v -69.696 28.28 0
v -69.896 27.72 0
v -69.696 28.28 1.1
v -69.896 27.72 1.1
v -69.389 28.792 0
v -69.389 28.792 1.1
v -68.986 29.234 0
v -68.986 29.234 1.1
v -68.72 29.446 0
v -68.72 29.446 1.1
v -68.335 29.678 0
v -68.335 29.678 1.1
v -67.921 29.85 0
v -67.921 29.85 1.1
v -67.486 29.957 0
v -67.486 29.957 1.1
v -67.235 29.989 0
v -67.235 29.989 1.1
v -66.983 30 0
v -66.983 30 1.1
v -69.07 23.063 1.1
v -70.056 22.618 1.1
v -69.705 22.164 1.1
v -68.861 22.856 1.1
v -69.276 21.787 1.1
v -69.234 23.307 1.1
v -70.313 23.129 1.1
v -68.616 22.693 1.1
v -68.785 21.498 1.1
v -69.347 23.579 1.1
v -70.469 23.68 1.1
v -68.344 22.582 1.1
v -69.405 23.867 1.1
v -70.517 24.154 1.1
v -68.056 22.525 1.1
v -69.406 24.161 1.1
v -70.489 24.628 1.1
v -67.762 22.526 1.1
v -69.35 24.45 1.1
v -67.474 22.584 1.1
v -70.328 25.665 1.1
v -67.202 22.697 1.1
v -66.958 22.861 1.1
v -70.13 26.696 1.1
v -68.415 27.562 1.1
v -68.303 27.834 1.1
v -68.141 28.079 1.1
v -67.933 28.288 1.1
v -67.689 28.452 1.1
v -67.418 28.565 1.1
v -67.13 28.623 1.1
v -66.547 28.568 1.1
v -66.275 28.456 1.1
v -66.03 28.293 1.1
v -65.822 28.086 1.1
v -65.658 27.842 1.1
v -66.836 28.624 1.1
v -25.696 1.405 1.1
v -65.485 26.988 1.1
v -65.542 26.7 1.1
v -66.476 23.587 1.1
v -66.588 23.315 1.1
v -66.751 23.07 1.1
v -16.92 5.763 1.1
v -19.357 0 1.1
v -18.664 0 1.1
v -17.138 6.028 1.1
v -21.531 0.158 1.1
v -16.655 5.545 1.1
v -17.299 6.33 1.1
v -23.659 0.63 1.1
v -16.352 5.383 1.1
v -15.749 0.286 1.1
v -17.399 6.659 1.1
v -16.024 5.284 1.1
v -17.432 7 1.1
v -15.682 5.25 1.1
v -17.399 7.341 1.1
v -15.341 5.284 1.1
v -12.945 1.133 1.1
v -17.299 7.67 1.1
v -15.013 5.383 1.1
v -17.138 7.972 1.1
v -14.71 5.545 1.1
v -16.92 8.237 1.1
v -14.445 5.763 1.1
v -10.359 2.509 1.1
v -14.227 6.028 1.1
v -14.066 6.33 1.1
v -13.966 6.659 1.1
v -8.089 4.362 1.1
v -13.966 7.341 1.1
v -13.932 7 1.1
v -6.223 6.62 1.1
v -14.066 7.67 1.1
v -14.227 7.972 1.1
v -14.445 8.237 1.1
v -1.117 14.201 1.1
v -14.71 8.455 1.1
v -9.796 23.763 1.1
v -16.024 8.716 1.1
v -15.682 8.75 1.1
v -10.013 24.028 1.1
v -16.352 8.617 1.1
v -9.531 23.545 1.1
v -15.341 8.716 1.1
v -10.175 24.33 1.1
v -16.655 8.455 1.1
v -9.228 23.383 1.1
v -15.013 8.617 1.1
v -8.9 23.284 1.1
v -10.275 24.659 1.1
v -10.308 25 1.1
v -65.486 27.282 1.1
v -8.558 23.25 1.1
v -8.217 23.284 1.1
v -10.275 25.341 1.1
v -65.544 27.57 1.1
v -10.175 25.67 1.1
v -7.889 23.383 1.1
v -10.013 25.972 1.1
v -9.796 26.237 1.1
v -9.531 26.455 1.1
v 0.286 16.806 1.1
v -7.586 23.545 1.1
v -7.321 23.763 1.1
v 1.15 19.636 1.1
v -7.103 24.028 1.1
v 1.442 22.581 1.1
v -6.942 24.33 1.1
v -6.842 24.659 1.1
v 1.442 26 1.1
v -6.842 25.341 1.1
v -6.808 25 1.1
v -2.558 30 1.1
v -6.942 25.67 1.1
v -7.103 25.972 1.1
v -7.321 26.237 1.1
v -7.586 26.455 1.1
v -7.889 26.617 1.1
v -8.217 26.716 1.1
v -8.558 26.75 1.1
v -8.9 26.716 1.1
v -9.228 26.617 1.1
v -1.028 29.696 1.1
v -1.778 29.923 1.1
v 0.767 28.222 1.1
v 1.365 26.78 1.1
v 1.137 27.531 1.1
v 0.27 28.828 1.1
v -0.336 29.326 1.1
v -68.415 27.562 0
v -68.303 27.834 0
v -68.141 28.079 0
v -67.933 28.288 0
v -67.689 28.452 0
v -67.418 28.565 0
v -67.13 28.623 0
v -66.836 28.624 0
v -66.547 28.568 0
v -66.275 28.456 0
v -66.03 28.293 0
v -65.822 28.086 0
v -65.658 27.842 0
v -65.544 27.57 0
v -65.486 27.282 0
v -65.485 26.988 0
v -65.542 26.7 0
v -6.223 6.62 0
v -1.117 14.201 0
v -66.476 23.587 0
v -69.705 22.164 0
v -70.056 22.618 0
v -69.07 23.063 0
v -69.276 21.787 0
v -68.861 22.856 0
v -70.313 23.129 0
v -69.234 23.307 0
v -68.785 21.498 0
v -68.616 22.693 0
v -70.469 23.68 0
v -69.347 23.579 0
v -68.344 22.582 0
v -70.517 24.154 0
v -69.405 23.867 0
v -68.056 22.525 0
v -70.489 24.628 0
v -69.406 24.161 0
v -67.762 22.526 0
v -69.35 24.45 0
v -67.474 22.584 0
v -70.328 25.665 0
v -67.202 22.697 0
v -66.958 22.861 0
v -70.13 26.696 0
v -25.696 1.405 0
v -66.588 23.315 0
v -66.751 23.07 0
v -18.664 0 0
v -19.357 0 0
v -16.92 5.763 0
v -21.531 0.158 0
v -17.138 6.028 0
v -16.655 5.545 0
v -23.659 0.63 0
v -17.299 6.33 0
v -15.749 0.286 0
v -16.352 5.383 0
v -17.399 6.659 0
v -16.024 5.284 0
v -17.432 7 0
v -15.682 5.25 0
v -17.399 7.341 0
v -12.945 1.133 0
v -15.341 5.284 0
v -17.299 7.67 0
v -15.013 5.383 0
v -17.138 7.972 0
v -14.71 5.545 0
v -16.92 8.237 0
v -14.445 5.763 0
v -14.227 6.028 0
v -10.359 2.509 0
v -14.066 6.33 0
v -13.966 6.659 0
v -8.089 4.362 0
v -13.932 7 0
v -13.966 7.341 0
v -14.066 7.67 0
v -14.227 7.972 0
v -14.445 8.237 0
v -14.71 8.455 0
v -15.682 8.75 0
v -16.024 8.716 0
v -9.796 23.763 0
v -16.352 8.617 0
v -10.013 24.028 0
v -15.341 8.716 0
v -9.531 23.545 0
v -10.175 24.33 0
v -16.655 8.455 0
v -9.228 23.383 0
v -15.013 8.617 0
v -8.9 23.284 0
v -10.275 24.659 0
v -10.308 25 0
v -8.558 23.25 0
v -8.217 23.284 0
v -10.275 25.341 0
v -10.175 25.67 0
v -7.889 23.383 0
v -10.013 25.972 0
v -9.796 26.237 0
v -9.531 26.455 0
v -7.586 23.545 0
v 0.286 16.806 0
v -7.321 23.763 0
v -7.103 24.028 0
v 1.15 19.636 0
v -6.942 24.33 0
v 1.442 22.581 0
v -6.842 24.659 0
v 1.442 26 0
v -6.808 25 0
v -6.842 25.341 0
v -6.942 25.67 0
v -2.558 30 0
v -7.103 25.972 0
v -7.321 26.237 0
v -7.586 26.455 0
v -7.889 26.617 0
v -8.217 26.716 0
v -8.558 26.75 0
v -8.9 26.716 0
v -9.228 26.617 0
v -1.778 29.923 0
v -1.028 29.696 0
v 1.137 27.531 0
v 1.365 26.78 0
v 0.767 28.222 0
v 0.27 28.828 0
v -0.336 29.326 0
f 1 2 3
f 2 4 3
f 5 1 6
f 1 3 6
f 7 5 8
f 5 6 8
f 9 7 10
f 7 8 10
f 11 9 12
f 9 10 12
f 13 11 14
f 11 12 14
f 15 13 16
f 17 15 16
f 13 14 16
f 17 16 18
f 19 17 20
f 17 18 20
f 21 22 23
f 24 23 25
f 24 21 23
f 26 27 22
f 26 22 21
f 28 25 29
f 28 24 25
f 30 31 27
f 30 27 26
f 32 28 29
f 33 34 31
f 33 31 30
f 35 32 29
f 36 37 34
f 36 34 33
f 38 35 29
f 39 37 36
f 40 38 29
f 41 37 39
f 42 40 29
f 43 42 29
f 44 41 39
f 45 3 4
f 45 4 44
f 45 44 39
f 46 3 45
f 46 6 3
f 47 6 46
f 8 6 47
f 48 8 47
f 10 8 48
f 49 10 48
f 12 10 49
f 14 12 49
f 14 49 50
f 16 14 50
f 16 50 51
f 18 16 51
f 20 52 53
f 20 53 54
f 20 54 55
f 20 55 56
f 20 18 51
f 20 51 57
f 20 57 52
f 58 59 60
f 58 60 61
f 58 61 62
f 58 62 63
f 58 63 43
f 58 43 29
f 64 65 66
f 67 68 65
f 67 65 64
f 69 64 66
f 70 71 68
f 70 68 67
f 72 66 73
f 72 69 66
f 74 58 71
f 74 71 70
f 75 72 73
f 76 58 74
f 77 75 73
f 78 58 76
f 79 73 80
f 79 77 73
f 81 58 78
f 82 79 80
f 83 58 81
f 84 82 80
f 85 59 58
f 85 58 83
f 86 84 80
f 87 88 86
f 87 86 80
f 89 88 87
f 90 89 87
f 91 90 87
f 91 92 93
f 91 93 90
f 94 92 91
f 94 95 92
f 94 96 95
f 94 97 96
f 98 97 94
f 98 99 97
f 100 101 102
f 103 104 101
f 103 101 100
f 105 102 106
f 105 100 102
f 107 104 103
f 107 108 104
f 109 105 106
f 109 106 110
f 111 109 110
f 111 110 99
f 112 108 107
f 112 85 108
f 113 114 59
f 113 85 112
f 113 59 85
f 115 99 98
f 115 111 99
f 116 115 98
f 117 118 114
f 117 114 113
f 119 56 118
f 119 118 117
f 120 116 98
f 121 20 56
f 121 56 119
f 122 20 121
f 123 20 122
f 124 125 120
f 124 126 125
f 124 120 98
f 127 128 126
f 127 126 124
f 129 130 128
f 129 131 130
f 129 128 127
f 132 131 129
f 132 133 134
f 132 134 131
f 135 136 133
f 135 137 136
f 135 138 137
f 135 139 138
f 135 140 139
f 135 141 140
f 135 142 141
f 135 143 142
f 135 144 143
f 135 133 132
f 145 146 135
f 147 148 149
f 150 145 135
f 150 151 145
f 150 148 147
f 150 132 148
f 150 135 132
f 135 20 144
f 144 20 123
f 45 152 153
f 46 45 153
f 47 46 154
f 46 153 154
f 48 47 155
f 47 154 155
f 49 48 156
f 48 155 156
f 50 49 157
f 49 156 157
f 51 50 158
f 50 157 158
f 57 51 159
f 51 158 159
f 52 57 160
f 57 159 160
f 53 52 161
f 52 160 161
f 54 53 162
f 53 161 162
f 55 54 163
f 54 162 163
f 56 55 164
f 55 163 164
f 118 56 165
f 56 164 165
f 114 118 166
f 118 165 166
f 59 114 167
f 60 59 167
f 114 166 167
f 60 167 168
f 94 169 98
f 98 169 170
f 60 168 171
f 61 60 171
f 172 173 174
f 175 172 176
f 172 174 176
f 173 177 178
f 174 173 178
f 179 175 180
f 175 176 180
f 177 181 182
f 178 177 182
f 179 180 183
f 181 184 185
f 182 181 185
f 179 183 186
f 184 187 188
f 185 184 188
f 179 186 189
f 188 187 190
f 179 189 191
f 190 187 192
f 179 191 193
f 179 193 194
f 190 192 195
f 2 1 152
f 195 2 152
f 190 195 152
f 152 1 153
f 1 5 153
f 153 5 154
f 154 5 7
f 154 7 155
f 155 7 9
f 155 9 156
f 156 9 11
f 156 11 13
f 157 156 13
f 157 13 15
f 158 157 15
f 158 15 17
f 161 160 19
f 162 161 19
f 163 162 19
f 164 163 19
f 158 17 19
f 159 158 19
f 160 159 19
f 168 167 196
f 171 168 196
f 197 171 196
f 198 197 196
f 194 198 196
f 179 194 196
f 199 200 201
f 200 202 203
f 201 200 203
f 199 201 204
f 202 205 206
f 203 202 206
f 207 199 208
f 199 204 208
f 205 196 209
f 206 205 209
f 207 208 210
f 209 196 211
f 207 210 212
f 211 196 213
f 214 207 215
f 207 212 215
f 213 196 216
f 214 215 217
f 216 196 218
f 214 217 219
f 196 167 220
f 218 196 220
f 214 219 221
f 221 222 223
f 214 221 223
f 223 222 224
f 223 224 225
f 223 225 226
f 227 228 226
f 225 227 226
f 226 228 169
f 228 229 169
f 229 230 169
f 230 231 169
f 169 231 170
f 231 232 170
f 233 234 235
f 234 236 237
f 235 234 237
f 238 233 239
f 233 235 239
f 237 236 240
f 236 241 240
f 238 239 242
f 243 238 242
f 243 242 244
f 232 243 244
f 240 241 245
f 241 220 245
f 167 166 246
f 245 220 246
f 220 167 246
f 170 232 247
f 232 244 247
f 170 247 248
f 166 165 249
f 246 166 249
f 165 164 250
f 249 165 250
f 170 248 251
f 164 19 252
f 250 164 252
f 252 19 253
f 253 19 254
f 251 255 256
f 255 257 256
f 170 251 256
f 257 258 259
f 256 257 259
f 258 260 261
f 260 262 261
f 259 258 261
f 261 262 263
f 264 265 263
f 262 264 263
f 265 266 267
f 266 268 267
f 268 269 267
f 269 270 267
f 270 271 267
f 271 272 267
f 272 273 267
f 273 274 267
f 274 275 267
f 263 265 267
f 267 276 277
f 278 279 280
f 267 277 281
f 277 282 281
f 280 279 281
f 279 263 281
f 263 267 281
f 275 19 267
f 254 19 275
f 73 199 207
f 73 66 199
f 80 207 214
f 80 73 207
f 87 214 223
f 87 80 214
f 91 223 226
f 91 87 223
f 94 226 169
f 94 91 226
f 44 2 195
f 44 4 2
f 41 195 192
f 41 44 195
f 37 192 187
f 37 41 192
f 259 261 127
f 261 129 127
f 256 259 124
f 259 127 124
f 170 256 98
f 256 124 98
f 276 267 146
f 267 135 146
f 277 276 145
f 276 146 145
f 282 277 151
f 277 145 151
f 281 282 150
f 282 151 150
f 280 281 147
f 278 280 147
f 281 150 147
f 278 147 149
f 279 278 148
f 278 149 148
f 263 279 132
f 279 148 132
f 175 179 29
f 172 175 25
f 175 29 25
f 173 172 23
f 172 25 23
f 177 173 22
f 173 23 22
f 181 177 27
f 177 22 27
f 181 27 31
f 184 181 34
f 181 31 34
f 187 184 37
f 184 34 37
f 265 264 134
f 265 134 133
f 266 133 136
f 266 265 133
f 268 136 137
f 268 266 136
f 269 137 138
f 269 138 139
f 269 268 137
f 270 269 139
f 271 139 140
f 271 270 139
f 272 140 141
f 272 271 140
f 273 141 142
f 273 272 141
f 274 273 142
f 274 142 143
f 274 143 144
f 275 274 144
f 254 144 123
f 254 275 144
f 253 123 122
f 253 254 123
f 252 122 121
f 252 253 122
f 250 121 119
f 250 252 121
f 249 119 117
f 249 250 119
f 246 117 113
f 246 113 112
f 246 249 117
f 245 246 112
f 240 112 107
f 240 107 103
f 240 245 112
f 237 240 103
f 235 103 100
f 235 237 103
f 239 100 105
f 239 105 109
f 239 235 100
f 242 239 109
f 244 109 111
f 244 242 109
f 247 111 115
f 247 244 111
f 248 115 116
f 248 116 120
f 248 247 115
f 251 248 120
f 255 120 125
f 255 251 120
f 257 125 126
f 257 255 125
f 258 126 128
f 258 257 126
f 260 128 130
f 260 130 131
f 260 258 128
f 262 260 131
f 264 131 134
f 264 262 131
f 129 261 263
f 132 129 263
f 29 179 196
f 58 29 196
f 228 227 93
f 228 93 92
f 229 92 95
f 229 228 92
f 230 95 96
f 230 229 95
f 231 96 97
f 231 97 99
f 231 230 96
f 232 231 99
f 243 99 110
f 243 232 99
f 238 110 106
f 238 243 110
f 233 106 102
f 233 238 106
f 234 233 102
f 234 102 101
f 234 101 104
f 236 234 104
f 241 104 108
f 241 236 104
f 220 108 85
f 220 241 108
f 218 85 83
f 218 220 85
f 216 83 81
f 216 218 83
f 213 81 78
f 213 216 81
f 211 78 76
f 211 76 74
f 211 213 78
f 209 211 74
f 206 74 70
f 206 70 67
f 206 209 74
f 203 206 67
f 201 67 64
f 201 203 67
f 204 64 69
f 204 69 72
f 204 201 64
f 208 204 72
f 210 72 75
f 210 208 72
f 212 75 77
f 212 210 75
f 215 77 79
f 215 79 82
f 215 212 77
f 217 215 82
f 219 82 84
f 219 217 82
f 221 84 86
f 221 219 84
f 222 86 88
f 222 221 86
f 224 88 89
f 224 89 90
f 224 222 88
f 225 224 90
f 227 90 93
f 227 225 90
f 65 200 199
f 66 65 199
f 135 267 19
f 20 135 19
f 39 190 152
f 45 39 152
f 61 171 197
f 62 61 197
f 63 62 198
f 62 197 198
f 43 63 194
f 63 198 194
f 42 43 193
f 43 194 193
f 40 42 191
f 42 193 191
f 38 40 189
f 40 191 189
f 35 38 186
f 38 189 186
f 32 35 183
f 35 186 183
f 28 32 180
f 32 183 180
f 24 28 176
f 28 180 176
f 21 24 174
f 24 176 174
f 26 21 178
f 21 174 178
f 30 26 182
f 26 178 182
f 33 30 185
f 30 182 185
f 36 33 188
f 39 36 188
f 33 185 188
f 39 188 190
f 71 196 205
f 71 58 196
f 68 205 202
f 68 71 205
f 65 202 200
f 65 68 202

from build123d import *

# Parameters (mm, degrees)
F0_R     = 1.75
F1_DEPTH = 1.1
F2_R     = 4
F3_R     = 30
F4_R     = 15
F5_R     = 3


with BuildPart() as f1:
    # F0 (on Top) → F1 (new body)
    with BuildSketch(Plane.XY):
        Polygon((-70.716745456, 22.3987678723), (-22.682432743, 0), (-10.682432743, 0), (1.4415796787, 18), (1.4415796787, 30), (-69.2492423021, 30), (-70.4260300789, 26.0807510217), align=None)
        with Locations((-15.682432743, 7)):
            Circle(F0_R, mode=Mode.SUBTRACT)
        with BuildLine():
            Line((-69.3496626194, 24.449523286), (-68.4150438499, 27.5622371752))
            ThreePointArc((-68.4150438499, 27.5622371752), (-66.5470441613, 28.5675118458), (-65.5417694907, 26.6995121572))
            Line((-65.5417694907, 26.6995121572), (-66.4763882602, 23.586798268))
            ThreePointArc((-66.4763882602, 23.586798268), (-68.3443879488, 22.5815235974), (-69.3496626194, 24.449523286))
        make_face(mode=Mode.SUBTRACT)
        with Locations((-8.5584203213, 24.9999999582)):
            Circle(F0_R, mode=Mode.SUBTRACT)
    extrude(amount=F1_DEPTH)

    # F2
    f2_edges = [f1.edges().sort_by_distance(p)[0] for p in [
        (1.44158, 30, 0.55),
    ]]
    fillet(f2_edges, radius=F2_R)

    # F3
    f3_edges = [f1.edges().sort_by_distance(p)[0] for p in [
        (-70.42603, 26.080751, 0.55),
    ]]
    fillet(f3_edges, radius=F3_R)

    # F4
    f4_edges = [f1.edges().sort_by_distance(p)[0] for p in [
        (-22.682433, 0, 0.55),
        (1.44158, 18, 0.55),
        (-10.682433, 0, 0.55),
    ]]
    fillet(f4_edges, radius=F4_R)

    # F5
    f5_edges = [f1.edges().sort_by_distance(p)[0] for p in [
        (-69.249242, 30, 0.55),
        (-70.716745, 22.398768, 0.55),
    ]]
    fillet(f5_edges, radius=F5_R)


solid = f1.part
